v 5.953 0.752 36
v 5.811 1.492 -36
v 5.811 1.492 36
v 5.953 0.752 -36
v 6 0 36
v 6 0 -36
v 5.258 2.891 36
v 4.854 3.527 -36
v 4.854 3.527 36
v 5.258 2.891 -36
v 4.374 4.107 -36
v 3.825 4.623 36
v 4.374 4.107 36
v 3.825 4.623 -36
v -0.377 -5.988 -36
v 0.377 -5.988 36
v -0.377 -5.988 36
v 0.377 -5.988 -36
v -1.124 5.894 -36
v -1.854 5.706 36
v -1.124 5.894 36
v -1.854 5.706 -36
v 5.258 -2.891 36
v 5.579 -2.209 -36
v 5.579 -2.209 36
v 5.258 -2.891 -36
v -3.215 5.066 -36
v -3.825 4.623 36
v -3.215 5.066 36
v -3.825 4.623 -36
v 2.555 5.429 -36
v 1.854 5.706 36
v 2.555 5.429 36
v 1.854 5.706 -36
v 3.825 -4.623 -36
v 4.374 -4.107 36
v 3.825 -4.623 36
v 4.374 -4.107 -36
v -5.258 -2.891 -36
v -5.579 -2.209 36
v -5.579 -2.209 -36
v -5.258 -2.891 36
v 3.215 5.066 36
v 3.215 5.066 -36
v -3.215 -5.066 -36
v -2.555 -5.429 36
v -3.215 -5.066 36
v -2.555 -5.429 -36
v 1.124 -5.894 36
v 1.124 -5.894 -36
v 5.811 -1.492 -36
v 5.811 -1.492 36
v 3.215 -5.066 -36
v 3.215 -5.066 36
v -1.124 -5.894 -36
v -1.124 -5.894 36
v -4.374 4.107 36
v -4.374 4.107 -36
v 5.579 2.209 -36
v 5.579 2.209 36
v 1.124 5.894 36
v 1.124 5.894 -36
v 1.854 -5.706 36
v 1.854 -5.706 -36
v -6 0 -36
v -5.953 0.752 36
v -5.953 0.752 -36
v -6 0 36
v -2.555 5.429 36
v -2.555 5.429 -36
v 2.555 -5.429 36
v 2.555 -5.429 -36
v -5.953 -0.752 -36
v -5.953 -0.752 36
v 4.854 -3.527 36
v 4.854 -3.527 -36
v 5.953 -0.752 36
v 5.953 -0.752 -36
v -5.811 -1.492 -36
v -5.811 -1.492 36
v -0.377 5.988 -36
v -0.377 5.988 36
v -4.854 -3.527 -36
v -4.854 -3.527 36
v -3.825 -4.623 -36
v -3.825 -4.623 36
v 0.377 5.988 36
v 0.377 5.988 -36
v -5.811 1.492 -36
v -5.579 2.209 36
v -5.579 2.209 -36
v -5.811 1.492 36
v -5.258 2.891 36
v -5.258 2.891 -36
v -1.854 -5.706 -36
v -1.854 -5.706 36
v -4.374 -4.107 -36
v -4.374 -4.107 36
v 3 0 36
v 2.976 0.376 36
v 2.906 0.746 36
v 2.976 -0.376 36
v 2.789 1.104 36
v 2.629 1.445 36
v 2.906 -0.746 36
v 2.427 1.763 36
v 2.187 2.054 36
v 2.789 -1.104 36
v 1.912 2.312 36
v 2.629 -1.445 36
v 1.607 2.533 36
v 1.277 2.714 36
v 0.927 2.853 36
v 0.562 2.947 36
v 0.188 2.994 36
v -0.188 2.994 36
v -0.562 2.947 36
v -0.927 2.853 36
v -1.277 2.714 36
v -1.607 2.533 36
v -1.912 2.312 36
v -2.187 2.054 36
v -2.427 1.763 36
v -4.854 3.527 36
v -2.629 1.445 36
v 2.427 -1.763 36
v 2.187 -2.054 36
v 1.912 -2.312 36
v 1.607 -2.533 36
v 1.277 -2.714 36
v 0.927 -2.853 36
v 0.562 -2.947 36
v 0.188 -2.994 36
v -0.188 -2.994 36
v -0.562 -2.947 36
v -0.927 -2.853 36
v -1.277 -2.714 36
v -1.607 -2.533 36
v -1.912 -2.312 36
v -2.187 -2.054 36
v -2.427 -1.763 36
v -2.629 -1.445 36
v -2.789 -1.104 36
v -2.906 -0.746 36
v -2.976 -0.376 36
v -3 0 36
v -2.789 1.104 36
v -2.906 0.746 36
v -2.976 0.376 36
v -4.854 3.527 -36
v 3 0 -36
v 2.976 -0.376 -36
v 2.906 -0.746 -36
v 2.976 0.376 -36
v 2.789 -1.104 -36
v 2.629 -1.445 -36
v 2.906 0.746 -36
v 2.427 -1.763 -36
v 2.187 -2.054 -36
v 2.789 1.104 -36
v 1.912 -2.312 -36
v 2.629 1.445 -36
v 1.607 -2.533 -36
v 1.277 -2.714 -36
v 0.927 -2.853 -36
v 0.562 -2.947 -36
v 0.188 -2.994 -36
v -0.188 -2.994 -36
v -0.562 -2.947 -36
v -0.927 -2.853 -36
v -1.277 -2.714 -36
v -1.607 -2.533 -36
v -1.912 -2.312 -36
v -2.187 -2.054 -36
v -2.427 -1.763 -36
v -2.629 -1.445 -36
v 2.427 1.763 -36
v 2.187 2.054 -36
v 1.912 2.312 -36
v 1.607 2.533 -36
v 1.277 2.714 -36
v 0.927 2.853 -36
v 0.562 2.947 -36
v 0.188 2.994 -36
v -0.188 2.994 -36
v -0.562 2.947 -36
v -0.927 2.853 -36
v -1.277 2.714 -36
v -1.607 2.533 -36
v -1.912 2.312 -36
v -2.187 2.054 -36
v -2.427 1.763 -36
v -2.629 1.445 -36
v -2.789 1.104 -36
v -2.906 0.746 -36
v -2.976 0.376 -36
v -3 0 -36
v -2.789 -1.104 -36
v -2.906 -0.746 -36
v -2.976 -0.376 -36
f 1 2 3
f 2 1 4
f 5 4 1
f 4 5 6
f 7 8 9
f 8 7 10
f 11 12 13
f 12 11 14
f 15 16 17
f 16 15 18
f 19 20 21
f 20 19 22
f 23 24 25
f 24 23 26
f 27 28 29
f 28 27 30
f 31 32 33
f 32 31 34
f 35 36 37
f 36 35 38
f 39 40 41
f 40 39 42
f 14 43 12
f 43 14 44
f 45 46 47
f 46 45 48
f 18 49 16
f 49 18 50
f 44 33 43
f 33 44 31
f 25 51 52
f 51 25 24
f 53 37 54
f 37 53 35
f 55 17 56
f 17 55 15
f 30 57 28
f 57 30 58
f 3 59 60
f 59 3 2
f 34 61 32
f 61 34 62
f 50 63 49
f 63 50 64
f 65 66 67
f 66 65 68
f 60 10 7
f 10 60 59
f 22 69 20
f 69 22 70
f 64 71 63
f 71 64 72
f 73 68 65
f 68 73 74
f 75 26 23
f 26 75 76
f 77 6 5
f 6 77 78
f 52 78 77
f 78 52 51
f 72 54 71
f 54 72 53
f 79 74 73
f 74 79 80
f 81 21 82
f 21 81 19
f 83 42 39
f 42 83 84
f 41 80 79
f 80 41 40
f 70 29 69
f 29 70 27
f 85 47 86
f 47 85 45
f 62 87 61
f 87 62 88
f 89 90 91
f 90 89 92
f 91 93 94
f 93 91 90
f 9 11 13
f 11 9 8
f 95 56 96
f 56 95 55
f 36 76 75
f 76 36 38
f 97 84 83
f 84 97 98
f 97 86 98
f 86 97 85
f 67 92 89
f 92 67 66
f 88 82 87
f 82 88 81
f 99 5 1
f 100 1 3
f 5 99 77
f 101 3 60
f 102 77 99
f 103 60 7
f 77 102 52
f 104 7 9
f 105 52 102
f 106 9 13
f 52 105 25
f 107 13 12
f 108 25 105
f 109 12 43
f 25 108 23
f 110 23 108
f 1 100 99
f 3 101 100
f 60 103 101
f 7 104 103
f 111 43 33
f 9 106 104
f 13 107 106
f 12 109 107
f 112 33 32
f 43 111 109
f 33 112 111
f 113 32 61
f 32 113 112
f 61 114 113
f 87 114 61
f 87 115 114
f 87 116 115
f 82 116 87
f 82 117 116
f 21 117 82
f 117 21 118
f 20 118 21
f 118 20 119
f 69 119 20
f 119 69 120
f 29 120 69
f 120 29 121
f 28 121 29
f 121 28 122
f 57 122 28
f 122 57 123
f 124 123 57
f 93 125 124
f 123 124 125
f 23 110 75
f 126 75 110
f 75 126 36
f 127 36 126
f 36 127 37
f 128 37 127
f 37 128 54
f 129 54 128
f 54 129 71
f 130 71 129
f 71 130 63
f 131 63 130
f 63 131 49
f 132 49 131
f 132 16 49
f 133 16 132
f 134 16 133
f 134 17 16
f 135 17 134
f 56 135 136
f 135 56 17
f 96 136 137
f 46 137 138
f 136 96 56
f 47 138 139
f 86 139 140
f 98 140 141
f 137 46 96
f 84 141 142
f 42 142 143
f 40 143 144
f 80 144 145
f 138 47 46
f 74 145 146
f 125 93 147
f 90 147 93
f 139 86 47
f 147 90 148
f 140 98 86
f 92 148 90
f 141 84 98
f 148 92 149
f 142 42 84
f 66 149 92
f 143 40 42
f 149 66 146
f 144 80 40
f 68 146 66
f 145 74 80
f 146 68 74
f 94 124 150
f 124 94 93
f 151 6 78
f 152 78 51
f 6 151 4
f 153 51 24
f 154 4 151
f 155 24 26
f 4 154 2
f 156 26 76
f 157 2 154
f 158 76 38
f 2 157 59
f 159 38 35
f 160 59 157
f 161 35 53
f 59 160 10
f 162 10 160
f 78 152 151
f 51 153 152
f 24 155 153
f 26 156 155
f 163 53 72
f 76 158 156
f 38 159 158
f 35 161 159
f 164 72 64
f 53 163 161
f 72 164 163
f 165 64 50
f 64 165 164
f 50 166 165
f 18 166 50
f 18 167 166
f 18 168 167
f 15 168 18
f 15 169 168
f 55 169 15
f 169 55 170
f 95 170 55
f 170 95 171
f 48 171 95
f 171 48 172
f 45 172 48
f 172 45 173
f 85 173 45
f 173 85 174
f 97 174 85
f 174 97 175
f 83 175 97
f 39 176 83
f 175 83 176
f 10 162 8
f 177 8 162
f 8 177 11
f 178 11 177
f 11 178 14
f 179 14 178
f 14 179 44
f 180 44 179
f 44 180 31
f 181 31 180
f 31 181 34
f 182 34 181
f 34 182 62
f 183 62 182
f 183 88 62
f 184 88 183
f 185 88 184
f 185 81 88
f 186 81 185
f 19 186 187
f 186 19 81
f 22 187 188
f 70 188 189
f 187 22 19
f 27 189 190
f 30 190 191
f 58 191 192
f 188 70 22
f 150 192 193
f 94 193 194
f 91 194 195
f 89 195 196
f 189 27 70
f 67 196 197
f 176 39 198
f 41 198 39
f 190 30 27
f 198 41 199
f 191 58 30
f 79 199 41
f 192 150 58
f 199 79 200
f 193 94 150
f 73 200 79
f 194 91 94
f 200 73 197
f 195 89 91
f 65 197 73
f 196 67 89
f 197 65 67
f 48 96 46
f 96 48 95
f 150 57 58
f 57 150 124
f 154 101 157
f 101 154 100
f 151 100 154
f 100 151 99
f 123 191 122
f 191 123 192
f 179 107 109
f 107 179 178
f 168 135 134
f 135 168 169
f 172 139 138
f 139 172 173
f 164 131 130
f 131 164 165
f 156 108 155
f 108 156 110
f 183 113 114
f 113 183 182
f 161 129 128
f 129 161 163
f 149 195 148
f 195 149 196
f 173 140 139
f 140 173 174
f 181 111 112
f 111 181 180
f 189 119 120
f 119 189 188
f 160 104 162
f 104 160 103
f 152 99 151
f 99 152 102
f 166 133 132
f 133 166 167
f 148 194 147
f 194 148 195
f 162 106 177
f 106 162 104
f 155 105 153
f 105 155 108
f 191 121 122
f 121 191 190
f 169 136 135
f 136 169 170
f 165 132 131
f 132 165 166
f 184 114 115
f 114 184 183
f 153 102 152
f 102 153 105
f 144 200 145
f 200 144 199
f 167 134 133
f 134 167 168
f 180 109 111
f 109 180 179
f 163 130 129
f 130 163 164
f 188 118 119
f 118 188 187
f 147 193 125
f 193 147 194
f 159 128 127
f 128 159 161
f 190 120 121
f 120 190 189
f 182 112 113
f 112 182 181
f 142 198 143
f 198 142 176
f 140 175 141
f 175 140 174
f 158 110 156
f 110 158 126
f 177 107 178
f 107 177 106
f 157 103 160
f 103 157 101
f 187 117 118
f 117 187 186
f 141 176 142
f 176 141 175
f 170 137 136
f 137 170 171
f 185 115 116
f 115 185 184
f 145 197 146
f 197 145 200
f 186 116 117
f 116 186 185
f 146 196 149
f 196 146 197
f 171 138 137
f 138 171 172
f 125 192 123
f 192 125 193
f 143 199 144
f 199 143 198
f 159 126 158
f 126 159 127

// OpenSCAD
$fn = 50;


difference() {
	union() {
		translate(v = [0, 0, -36.0000000000]) {
			cylinder(h = 72, r = 6.0000000000);
		}
	}
	union() {
		translate(v = [0, 0, -100.0000000000]) {
			cylinder(h = 200, r = 3.0000000000);
		}
	}
}
